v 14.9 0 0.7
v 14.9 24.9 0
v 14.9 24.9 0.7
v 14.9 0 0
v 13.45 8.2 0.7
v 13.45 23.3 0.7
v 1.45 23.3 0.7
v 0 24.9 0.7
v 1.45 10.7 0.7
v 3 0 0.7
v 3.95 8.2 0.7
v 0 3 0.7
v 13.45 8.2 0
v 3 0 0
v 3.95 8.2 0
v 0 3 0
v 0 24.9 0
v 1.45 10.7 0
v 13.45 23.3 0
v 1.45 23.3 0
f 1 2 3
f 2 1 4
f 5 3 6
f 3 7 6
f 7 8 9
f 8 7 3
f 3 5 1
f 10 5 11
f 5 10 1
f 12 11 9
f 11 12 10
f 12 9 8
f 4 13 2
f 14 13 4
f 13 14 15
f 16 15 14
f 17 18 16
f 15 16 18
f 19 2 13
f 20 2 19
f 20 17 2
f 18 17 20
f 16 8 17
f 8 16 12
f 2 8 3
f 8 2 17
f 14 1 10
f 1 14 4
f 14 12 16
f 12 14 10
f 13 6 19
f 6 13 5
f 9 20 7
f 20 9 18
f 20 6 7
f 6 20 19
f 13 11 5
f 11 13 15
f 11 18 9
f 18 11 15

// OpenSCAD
//Loguncov Maxim 18.01.14



module mini_sim() {
  difference() {
    cube([14.9, 24.9, 0.7]);
    translate([3, 0, -5]) rotate([0, 0, -45]) mirror([-1, -1, 0]) cube(10);
  }
}

module micro_sim() {
  difference() {
    cube([12, 15.1, 0.8]);
    translate([2.5, 0, -5]) rotate([0, 0, -45]) mirror([-1, -1, 0]) cube(10);
  }
}

module expand() {
  translate([0, 0, -0.1]) scale([1, 1, 1.2]) child(0);
}

module micro_mini_change() {
  difference() {
    mini_sim();
    translate([1.45, 8.2, 0])
      expand()
        micro_sim();
  }
}

micro_mini_change();
